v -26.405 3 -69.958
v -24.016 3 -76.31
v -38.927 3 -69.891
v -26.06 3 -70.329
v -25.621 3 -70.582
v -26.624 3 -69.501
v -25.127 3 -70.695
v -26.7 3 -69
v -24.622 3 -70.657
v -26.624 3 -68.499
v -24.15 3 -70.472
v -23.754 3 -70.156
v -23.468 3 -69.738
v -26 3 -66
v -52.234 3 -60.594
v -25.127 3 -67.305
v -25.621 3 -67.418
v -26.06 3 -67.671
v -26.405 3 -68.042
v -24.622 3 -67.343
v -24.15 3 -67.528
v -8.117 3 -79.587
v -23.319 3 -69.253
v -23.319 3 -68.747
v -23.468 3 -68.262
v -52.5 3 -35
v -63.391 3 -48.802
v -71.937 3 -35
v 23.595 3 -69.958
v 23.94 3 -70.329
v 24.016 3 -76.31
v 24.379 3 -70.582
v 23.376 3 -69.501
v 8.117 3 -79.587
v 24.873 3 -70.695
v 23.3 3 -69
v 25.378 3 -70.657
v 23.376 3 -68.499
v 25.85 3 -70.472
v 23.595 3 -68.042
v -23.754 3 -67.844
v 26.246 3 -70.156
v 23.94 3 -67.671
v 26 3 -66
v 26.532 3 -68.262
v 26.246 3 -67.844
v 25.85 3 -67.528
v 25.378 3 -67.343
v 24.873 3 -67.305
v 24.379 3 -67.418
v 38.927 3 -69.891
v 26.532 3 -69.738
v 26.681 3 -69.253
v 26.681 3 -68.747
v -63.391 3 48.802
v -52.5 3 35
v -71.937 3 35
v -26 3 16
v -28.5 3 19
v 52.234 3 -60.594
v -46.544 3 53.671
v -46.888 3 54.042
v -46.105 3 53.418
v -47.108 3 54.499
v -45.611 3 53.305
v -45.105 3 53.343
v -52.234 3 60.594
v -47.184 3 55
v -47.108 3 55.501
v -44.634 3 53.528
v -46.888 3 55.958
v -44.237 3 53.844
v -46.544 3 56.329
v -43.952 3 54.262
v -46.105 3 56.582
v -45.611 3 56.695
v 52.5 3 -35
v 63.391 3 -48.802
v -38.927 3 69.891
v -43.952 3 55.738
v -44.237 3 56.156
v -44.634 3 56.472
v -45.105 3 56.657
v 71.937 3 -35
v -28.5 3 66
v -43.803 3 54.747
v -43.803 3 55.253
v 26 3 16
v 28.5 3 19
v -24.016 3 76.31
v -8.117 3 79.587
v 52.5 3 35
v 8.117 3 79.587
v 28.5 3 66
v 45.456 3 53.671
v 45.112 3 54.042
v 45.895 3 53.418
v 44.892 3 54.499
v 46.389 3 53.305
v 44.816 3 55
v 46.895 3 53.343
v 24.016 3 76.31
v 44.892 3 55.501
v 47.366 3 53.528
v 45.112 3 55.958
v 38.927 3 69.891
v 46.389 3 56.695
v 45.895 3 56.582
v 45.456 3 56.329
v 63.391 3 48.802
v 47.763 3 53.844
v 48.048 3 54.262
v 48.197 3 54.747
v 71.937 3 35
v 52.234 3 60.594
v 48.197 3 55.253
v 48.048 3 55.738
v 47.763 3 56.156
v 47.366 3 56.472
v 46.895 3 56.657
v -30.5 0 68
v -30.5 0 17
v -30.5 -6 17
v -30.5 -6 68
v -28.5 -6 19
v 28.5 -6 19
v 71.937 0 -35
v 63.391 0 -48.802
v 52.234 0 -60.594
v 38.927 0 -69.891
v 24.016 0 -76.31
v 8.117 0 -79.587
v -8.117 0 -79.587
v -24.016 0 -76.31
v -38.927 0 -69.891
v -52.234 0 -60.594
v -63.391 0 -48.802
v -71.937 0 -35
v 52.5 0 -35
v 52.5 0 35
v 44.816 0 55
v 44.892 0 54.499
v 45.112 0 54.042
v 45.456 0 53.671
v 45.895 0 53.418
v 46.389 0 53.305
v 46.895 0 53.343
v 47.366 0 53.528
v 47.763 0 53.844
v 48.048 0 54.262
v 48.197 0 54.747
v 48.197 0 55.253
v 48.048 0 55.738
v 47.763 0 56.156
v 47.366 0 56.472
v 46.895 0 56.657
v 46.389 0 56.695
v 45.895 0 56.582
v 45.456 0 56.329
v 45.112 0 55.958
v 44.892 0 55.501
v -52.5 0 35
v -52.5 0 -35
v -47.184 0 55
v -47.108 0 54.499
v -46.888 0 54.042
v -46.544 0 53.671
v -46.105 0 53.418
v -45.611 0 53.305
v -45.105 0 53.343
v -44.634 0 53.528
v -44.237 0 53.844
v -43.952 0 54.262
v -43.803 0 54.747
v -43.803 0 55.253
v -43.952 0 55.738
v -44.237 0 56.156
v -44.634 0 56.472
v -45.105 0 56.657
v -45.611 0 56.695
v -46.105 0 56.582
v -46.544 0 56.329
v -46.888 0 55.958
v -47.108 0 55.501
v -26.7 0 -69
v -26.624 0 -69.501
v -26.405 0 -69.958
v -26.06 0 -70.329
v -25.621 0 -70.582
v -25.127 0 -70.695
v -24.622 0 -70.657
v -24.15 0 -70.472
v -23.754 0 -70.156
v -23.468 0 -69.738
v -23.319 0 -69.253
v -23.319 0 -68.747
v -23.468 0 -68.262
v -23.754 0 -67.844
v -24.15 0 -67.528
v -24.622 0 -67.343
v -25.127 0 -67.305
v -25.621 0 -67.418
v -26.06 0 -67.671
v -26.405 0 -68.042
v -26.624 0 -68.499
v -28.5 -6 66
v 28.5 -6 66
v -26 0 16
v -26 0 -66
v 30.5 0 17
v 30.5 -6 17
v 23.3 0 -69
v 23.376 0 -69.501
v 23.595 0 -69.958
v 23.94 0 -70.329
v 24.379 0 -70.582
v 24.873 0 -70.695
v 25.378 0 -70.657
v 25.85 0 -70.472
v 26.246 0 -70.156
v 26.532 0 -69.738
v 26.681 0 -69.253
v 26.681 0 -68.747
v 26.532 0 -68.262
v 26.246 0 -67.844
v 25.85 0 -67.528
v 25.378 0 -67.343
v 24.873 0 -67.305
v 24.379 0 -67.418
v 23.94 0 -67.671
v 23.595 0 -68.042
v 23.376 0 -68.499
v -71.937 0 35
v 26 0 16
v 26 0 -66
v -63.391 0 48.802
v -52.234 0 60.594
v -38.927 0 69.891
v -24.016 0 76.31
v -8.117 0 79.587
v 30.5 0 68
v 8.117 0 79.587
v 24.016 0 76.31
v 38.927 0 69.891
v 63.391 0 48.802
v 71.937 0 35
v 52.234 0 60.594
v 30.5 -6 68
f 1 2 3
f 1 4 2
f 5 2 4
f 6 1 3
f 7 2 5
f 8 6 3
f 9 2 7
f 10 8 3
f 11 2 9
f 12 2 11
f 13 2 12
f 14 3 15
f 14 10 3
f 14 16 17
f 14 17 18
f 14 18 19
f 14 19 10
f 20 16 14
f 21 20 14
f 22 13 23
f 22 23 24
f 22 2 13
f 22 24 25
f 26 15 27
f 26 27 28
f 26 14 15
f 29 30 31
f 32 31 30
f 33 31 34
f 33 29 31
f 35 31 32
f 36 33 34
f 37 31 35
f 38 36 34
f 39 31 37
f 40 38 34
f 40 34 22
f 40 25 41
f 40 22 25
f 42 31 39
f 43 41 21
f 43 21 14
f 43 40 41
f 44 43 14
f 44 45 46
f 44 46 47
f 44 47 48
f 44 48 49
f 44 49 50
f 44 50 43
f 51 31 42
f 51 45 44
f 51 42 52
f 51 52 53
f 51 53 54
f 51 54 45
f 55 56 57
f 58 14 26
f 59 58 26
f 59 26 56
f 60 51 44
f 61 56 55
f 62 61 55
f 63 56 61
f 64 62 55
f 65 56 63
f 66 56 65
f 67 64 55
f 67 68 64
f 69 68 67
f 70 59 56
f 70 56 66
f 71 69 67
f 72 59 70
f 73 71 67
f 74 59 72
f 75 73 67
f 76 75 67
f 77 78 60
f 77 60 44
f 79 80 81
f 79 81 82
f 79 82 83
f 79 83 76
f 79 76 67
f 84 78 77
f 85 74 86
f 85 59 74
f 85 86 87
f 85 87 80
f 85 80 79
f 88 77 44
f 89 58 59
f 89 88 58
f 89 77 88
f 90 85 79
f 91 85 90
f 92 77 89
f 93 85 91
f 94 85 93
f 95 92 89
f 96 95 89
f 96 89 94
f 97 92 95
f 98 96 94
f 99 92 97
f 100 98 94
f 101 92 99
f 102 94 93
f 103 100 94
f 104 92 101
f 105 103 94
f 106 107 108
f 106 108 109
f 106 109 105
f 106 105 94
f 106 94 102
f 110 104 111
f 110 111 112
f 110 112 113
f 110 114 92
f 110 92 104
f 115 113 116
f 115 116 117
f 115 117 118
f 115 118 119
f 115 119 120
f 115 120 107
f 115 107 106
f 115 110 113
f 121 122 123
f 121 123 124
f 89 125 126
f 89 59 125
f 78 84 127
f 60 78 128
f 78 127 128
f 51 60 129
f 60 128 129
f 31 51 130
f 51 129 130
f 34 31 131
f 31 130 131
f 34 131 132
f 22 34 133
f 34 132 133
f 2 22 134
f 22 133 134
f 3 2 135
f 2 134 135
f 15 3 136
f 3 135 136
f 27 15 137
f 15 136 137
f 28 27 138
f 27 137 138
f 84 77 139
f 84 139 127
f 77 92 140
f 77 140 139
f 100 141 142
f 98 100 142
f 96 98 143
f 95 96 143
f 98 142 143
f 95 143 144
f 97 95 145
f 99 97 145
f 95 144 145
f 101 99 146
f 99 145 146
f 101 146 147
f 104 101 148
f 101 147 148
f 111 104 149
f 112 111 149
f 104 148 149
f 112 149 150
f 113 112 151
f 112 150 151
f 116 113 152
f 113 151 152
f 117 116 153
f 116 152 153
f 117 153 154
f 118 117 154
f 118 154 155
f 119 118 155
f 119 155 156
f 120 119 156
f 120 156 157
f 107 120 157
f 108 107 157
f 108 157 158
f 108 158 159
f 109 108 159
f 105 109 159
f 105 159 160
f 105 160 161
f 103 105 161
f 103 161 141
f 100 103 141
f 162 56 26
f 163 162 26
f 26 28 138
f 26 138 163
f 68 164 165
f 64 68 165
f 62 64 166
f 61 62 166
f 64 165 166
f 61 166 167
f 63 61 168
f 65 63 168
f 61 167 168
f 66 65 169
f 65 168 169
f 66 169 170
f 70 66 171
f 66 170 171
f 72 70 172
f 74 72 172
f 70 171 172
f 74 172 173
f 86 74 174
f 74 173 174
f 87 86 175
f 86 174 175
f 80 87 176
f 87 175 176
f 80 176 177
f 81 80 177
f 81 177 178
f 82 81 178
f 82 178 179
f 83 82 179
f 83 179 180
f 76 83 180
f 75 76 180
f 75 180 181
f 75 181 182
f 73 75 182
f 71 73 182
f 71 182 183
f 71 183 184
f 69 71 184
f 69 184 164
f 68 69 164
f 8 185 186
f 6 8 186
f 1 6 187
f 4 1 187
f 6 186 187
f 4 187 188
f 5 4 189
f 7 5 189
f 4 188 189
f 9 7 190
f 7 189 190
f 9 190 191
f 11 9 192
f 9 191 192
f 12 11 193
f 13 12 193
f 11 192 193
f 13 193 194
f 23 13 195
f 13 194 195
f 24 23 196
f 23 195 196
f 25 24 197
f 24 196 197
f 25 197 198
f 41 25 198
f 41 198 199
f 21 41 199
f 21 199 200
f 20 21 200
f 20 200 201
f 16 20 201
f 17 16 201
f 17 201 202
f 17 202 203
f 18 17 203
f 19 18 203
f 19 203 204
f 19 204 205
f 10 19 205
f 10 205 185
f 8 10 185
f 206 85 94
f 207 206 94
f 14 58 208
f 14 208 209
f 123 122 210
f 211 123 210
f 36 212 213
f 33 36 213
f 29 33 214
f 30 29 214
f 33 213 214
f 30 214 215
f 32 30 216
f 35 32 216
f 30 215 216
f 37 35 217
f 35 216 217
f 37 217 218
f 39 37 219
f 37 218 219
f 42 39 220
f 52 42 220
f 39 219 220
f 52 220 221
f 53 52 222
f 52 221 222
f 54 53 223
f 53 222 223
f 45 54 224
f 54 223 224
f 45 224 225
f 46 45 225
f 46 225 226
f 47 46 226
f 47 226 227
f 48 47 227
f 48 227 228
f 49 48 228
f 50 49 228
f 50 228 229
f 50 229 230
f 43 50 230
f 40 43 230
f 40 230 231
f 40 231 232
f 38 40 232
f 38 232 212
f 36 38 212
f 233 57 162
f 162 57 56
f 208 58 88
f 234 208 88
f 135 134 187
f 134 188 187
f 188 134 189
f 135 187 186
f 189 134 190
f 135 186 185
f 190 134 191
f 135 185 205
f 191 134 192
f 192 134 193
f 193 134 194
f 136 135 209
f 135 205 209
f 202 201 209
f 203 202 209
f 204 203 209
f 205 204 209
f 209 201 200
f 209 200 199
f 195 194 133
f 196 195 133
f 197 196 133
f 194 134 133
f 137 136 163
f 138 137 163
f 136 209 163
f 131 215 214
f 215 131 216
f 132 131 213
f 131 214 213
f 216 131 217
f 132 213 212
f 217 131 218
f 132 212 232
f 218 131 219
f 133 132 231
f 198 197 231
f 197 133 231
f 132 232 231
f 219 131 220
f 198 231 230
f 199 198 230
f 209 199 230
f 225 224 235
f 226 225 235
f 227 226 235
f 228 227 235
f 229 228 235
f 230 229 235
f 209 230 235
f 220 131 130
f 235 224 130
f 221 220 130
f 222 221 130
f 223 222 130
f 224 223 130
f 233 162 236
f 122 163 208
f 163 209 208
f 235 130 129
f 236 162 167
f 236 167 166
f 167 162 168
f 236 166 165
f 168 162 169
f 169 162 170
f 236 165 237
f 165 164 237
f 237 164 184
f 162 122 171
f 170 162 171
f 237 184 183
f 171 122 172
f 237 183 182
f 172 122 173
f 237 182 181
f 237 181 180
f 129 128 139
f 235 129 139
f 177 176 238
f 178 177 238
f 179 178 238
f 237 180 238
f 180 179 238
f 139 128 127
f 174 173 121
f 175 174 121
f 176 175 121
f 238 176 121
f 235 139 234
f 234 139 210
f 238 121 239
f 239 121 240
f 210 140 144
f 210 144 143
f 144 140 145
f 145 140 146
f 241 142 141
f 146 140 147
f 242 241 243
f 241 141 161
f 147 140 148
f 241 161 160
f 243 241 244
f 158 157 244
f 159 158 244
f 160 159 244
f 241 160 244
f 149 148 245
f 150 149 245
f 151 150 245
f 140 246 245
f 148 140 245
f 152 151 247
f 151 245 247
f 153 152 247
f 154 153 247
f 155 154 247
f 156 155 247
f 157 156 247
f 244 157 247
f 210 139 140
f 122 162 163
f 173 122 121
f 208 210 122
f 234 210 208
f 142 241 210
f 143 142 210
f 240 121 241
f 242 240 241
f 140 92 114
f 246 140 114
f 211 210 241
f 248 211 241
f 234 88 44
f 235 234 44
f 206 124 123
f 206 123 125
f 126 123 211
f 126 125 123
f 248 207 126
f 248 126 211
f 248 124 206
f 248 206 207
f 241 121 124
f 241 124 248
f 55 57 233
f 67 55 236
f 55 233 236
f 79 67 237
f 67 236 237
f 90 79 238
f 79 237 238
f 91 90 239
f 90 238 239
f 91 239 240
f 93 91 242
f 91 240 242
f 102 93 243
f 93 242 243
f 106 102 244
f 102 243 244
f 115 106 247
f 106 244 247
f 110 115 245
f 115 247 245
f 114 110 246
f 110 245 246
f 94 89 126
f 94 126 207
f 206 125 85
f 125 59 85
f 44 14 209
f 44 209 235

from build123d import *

# Parameters (mm, degrees)
ESQUISSE1_R             = 80
BOSS_EXTRU_1_DEPTH      = 3
ESQUISSE2_W             = 55
ESQUISSE2_H             = 70
ENL_V_MAT_EXTRU_1_DEPTH = 114.176852757
D_GAGEMENT_M31_D        = 3.4
D_GAGEMENT_M31_DEPTH    = 24
D_GAGEMENT_M31_TIP      = 1.021463052
ESQUISSE11_W            = 52
ESQUISSE11_H            = 82
ESQUISSE11_W_2          = 57
ESQUISSE11_H_2          = 47
ENL_V_MAT_EXTRU_2_DEPTH = 108.628992377
ESQUISSE12_W            = 61
ESQUISSE12_H            = 51
ESQUISSE12_W_2          = 57
ESQUISSE12_H_2          = 47
BOSS_EXTRU_2_DEPTH      = 6


with BuildPart() as part:
    # Esquisse1 → Boss.-Extru.1 (new body)
    with BuildSketch(Plane(origin=(0, 0, 0), x_dir=(1, 0, 0), z_dir=(0, 1, 0))):
        with Locations(Location((0, 0, 0), (0, 0, 270))):
            Circle(ESQUISSE1_R)
    extrude(amount=BOSS_EXTRU_1_DEPTH)

    # Esquisse2 → Enlèv. mat.-Extru.1 (cut, through all)
    with BuildSketch(Plane(origin=(0, 3, 0), x_dir=(1, 0, 0), z_dir=(0, 1, 0))):
        with Locations((-80, 0)):
            Rectangle(ESQUISSE2_W, ESQUISSE2_H)
        with Locations((80, 0)):
            Rectangle(ESQUISSE2_W, ESQUISSE2_H)
    extrude(amount=-ENL_V_MAT_EXTRU_1_DEPTH, mode=Mode.SUBTRACT)

    # Dégagement M31
    with Locations(Plane(origin=(0, 3, 0), x_dir=(1, 0, 0), z_dir=(0, 1, 0))):
        with Locations((-45.483572208, -55), (46.516427792, -55), (-25, 69), (25, 69)):
            Hole(D_GAGEMENT_M31_D / 2, depth=D_GAGEMENT_M31_DEPTH)
            with Locations((0, 0, -(D_GAGEMENT_M31_DEPTH + D_GAGEMENT_M31_TIP / 2))):  # 118° drill point
                Cone(0, D_GAGEMENT_M31_D / 2, D_GAGEMENT_M31_TIP, mode=Mode.SUBTRACT)

    # Esquisse11 → Enlèv. mat.-Extru.2 (cut, through all)
    with BuildSketch(Plane(origin=(0, 3, 0), x_dir=(1, 0, 0), z_dir=(0, 1, 0))):
        with Locations((0, 25)):
            Rectangle(ESQUISSE11_W, ESQUISSE11_H)
        with Locations((0, -42.5)):
            Rectangle(ESQUISSE11_W_2, ESQUISSE11_H_2)
    extrude(amount=-ENL_V_MAT_EXTRU_2_DEPTH, mode=Mode.SUBTRACT)

    # Esquisse12 → Boss.-Extru.2 (add)
    with BuildSketch(Plane.XZ):
        with Locations((0, 42.5)):
            Rectangle(ESQUISSE12_W, ESQUISSE12_H)
        with Locations((0, 42.5)):
            Rectangle(ESQUISSE12_W_2, ESQUISSE12_H_2, mode=Mode.SUBTRACT)
    extrude(amount=BOSS_EXTRU_2_DEPTH)


solid = part.part
